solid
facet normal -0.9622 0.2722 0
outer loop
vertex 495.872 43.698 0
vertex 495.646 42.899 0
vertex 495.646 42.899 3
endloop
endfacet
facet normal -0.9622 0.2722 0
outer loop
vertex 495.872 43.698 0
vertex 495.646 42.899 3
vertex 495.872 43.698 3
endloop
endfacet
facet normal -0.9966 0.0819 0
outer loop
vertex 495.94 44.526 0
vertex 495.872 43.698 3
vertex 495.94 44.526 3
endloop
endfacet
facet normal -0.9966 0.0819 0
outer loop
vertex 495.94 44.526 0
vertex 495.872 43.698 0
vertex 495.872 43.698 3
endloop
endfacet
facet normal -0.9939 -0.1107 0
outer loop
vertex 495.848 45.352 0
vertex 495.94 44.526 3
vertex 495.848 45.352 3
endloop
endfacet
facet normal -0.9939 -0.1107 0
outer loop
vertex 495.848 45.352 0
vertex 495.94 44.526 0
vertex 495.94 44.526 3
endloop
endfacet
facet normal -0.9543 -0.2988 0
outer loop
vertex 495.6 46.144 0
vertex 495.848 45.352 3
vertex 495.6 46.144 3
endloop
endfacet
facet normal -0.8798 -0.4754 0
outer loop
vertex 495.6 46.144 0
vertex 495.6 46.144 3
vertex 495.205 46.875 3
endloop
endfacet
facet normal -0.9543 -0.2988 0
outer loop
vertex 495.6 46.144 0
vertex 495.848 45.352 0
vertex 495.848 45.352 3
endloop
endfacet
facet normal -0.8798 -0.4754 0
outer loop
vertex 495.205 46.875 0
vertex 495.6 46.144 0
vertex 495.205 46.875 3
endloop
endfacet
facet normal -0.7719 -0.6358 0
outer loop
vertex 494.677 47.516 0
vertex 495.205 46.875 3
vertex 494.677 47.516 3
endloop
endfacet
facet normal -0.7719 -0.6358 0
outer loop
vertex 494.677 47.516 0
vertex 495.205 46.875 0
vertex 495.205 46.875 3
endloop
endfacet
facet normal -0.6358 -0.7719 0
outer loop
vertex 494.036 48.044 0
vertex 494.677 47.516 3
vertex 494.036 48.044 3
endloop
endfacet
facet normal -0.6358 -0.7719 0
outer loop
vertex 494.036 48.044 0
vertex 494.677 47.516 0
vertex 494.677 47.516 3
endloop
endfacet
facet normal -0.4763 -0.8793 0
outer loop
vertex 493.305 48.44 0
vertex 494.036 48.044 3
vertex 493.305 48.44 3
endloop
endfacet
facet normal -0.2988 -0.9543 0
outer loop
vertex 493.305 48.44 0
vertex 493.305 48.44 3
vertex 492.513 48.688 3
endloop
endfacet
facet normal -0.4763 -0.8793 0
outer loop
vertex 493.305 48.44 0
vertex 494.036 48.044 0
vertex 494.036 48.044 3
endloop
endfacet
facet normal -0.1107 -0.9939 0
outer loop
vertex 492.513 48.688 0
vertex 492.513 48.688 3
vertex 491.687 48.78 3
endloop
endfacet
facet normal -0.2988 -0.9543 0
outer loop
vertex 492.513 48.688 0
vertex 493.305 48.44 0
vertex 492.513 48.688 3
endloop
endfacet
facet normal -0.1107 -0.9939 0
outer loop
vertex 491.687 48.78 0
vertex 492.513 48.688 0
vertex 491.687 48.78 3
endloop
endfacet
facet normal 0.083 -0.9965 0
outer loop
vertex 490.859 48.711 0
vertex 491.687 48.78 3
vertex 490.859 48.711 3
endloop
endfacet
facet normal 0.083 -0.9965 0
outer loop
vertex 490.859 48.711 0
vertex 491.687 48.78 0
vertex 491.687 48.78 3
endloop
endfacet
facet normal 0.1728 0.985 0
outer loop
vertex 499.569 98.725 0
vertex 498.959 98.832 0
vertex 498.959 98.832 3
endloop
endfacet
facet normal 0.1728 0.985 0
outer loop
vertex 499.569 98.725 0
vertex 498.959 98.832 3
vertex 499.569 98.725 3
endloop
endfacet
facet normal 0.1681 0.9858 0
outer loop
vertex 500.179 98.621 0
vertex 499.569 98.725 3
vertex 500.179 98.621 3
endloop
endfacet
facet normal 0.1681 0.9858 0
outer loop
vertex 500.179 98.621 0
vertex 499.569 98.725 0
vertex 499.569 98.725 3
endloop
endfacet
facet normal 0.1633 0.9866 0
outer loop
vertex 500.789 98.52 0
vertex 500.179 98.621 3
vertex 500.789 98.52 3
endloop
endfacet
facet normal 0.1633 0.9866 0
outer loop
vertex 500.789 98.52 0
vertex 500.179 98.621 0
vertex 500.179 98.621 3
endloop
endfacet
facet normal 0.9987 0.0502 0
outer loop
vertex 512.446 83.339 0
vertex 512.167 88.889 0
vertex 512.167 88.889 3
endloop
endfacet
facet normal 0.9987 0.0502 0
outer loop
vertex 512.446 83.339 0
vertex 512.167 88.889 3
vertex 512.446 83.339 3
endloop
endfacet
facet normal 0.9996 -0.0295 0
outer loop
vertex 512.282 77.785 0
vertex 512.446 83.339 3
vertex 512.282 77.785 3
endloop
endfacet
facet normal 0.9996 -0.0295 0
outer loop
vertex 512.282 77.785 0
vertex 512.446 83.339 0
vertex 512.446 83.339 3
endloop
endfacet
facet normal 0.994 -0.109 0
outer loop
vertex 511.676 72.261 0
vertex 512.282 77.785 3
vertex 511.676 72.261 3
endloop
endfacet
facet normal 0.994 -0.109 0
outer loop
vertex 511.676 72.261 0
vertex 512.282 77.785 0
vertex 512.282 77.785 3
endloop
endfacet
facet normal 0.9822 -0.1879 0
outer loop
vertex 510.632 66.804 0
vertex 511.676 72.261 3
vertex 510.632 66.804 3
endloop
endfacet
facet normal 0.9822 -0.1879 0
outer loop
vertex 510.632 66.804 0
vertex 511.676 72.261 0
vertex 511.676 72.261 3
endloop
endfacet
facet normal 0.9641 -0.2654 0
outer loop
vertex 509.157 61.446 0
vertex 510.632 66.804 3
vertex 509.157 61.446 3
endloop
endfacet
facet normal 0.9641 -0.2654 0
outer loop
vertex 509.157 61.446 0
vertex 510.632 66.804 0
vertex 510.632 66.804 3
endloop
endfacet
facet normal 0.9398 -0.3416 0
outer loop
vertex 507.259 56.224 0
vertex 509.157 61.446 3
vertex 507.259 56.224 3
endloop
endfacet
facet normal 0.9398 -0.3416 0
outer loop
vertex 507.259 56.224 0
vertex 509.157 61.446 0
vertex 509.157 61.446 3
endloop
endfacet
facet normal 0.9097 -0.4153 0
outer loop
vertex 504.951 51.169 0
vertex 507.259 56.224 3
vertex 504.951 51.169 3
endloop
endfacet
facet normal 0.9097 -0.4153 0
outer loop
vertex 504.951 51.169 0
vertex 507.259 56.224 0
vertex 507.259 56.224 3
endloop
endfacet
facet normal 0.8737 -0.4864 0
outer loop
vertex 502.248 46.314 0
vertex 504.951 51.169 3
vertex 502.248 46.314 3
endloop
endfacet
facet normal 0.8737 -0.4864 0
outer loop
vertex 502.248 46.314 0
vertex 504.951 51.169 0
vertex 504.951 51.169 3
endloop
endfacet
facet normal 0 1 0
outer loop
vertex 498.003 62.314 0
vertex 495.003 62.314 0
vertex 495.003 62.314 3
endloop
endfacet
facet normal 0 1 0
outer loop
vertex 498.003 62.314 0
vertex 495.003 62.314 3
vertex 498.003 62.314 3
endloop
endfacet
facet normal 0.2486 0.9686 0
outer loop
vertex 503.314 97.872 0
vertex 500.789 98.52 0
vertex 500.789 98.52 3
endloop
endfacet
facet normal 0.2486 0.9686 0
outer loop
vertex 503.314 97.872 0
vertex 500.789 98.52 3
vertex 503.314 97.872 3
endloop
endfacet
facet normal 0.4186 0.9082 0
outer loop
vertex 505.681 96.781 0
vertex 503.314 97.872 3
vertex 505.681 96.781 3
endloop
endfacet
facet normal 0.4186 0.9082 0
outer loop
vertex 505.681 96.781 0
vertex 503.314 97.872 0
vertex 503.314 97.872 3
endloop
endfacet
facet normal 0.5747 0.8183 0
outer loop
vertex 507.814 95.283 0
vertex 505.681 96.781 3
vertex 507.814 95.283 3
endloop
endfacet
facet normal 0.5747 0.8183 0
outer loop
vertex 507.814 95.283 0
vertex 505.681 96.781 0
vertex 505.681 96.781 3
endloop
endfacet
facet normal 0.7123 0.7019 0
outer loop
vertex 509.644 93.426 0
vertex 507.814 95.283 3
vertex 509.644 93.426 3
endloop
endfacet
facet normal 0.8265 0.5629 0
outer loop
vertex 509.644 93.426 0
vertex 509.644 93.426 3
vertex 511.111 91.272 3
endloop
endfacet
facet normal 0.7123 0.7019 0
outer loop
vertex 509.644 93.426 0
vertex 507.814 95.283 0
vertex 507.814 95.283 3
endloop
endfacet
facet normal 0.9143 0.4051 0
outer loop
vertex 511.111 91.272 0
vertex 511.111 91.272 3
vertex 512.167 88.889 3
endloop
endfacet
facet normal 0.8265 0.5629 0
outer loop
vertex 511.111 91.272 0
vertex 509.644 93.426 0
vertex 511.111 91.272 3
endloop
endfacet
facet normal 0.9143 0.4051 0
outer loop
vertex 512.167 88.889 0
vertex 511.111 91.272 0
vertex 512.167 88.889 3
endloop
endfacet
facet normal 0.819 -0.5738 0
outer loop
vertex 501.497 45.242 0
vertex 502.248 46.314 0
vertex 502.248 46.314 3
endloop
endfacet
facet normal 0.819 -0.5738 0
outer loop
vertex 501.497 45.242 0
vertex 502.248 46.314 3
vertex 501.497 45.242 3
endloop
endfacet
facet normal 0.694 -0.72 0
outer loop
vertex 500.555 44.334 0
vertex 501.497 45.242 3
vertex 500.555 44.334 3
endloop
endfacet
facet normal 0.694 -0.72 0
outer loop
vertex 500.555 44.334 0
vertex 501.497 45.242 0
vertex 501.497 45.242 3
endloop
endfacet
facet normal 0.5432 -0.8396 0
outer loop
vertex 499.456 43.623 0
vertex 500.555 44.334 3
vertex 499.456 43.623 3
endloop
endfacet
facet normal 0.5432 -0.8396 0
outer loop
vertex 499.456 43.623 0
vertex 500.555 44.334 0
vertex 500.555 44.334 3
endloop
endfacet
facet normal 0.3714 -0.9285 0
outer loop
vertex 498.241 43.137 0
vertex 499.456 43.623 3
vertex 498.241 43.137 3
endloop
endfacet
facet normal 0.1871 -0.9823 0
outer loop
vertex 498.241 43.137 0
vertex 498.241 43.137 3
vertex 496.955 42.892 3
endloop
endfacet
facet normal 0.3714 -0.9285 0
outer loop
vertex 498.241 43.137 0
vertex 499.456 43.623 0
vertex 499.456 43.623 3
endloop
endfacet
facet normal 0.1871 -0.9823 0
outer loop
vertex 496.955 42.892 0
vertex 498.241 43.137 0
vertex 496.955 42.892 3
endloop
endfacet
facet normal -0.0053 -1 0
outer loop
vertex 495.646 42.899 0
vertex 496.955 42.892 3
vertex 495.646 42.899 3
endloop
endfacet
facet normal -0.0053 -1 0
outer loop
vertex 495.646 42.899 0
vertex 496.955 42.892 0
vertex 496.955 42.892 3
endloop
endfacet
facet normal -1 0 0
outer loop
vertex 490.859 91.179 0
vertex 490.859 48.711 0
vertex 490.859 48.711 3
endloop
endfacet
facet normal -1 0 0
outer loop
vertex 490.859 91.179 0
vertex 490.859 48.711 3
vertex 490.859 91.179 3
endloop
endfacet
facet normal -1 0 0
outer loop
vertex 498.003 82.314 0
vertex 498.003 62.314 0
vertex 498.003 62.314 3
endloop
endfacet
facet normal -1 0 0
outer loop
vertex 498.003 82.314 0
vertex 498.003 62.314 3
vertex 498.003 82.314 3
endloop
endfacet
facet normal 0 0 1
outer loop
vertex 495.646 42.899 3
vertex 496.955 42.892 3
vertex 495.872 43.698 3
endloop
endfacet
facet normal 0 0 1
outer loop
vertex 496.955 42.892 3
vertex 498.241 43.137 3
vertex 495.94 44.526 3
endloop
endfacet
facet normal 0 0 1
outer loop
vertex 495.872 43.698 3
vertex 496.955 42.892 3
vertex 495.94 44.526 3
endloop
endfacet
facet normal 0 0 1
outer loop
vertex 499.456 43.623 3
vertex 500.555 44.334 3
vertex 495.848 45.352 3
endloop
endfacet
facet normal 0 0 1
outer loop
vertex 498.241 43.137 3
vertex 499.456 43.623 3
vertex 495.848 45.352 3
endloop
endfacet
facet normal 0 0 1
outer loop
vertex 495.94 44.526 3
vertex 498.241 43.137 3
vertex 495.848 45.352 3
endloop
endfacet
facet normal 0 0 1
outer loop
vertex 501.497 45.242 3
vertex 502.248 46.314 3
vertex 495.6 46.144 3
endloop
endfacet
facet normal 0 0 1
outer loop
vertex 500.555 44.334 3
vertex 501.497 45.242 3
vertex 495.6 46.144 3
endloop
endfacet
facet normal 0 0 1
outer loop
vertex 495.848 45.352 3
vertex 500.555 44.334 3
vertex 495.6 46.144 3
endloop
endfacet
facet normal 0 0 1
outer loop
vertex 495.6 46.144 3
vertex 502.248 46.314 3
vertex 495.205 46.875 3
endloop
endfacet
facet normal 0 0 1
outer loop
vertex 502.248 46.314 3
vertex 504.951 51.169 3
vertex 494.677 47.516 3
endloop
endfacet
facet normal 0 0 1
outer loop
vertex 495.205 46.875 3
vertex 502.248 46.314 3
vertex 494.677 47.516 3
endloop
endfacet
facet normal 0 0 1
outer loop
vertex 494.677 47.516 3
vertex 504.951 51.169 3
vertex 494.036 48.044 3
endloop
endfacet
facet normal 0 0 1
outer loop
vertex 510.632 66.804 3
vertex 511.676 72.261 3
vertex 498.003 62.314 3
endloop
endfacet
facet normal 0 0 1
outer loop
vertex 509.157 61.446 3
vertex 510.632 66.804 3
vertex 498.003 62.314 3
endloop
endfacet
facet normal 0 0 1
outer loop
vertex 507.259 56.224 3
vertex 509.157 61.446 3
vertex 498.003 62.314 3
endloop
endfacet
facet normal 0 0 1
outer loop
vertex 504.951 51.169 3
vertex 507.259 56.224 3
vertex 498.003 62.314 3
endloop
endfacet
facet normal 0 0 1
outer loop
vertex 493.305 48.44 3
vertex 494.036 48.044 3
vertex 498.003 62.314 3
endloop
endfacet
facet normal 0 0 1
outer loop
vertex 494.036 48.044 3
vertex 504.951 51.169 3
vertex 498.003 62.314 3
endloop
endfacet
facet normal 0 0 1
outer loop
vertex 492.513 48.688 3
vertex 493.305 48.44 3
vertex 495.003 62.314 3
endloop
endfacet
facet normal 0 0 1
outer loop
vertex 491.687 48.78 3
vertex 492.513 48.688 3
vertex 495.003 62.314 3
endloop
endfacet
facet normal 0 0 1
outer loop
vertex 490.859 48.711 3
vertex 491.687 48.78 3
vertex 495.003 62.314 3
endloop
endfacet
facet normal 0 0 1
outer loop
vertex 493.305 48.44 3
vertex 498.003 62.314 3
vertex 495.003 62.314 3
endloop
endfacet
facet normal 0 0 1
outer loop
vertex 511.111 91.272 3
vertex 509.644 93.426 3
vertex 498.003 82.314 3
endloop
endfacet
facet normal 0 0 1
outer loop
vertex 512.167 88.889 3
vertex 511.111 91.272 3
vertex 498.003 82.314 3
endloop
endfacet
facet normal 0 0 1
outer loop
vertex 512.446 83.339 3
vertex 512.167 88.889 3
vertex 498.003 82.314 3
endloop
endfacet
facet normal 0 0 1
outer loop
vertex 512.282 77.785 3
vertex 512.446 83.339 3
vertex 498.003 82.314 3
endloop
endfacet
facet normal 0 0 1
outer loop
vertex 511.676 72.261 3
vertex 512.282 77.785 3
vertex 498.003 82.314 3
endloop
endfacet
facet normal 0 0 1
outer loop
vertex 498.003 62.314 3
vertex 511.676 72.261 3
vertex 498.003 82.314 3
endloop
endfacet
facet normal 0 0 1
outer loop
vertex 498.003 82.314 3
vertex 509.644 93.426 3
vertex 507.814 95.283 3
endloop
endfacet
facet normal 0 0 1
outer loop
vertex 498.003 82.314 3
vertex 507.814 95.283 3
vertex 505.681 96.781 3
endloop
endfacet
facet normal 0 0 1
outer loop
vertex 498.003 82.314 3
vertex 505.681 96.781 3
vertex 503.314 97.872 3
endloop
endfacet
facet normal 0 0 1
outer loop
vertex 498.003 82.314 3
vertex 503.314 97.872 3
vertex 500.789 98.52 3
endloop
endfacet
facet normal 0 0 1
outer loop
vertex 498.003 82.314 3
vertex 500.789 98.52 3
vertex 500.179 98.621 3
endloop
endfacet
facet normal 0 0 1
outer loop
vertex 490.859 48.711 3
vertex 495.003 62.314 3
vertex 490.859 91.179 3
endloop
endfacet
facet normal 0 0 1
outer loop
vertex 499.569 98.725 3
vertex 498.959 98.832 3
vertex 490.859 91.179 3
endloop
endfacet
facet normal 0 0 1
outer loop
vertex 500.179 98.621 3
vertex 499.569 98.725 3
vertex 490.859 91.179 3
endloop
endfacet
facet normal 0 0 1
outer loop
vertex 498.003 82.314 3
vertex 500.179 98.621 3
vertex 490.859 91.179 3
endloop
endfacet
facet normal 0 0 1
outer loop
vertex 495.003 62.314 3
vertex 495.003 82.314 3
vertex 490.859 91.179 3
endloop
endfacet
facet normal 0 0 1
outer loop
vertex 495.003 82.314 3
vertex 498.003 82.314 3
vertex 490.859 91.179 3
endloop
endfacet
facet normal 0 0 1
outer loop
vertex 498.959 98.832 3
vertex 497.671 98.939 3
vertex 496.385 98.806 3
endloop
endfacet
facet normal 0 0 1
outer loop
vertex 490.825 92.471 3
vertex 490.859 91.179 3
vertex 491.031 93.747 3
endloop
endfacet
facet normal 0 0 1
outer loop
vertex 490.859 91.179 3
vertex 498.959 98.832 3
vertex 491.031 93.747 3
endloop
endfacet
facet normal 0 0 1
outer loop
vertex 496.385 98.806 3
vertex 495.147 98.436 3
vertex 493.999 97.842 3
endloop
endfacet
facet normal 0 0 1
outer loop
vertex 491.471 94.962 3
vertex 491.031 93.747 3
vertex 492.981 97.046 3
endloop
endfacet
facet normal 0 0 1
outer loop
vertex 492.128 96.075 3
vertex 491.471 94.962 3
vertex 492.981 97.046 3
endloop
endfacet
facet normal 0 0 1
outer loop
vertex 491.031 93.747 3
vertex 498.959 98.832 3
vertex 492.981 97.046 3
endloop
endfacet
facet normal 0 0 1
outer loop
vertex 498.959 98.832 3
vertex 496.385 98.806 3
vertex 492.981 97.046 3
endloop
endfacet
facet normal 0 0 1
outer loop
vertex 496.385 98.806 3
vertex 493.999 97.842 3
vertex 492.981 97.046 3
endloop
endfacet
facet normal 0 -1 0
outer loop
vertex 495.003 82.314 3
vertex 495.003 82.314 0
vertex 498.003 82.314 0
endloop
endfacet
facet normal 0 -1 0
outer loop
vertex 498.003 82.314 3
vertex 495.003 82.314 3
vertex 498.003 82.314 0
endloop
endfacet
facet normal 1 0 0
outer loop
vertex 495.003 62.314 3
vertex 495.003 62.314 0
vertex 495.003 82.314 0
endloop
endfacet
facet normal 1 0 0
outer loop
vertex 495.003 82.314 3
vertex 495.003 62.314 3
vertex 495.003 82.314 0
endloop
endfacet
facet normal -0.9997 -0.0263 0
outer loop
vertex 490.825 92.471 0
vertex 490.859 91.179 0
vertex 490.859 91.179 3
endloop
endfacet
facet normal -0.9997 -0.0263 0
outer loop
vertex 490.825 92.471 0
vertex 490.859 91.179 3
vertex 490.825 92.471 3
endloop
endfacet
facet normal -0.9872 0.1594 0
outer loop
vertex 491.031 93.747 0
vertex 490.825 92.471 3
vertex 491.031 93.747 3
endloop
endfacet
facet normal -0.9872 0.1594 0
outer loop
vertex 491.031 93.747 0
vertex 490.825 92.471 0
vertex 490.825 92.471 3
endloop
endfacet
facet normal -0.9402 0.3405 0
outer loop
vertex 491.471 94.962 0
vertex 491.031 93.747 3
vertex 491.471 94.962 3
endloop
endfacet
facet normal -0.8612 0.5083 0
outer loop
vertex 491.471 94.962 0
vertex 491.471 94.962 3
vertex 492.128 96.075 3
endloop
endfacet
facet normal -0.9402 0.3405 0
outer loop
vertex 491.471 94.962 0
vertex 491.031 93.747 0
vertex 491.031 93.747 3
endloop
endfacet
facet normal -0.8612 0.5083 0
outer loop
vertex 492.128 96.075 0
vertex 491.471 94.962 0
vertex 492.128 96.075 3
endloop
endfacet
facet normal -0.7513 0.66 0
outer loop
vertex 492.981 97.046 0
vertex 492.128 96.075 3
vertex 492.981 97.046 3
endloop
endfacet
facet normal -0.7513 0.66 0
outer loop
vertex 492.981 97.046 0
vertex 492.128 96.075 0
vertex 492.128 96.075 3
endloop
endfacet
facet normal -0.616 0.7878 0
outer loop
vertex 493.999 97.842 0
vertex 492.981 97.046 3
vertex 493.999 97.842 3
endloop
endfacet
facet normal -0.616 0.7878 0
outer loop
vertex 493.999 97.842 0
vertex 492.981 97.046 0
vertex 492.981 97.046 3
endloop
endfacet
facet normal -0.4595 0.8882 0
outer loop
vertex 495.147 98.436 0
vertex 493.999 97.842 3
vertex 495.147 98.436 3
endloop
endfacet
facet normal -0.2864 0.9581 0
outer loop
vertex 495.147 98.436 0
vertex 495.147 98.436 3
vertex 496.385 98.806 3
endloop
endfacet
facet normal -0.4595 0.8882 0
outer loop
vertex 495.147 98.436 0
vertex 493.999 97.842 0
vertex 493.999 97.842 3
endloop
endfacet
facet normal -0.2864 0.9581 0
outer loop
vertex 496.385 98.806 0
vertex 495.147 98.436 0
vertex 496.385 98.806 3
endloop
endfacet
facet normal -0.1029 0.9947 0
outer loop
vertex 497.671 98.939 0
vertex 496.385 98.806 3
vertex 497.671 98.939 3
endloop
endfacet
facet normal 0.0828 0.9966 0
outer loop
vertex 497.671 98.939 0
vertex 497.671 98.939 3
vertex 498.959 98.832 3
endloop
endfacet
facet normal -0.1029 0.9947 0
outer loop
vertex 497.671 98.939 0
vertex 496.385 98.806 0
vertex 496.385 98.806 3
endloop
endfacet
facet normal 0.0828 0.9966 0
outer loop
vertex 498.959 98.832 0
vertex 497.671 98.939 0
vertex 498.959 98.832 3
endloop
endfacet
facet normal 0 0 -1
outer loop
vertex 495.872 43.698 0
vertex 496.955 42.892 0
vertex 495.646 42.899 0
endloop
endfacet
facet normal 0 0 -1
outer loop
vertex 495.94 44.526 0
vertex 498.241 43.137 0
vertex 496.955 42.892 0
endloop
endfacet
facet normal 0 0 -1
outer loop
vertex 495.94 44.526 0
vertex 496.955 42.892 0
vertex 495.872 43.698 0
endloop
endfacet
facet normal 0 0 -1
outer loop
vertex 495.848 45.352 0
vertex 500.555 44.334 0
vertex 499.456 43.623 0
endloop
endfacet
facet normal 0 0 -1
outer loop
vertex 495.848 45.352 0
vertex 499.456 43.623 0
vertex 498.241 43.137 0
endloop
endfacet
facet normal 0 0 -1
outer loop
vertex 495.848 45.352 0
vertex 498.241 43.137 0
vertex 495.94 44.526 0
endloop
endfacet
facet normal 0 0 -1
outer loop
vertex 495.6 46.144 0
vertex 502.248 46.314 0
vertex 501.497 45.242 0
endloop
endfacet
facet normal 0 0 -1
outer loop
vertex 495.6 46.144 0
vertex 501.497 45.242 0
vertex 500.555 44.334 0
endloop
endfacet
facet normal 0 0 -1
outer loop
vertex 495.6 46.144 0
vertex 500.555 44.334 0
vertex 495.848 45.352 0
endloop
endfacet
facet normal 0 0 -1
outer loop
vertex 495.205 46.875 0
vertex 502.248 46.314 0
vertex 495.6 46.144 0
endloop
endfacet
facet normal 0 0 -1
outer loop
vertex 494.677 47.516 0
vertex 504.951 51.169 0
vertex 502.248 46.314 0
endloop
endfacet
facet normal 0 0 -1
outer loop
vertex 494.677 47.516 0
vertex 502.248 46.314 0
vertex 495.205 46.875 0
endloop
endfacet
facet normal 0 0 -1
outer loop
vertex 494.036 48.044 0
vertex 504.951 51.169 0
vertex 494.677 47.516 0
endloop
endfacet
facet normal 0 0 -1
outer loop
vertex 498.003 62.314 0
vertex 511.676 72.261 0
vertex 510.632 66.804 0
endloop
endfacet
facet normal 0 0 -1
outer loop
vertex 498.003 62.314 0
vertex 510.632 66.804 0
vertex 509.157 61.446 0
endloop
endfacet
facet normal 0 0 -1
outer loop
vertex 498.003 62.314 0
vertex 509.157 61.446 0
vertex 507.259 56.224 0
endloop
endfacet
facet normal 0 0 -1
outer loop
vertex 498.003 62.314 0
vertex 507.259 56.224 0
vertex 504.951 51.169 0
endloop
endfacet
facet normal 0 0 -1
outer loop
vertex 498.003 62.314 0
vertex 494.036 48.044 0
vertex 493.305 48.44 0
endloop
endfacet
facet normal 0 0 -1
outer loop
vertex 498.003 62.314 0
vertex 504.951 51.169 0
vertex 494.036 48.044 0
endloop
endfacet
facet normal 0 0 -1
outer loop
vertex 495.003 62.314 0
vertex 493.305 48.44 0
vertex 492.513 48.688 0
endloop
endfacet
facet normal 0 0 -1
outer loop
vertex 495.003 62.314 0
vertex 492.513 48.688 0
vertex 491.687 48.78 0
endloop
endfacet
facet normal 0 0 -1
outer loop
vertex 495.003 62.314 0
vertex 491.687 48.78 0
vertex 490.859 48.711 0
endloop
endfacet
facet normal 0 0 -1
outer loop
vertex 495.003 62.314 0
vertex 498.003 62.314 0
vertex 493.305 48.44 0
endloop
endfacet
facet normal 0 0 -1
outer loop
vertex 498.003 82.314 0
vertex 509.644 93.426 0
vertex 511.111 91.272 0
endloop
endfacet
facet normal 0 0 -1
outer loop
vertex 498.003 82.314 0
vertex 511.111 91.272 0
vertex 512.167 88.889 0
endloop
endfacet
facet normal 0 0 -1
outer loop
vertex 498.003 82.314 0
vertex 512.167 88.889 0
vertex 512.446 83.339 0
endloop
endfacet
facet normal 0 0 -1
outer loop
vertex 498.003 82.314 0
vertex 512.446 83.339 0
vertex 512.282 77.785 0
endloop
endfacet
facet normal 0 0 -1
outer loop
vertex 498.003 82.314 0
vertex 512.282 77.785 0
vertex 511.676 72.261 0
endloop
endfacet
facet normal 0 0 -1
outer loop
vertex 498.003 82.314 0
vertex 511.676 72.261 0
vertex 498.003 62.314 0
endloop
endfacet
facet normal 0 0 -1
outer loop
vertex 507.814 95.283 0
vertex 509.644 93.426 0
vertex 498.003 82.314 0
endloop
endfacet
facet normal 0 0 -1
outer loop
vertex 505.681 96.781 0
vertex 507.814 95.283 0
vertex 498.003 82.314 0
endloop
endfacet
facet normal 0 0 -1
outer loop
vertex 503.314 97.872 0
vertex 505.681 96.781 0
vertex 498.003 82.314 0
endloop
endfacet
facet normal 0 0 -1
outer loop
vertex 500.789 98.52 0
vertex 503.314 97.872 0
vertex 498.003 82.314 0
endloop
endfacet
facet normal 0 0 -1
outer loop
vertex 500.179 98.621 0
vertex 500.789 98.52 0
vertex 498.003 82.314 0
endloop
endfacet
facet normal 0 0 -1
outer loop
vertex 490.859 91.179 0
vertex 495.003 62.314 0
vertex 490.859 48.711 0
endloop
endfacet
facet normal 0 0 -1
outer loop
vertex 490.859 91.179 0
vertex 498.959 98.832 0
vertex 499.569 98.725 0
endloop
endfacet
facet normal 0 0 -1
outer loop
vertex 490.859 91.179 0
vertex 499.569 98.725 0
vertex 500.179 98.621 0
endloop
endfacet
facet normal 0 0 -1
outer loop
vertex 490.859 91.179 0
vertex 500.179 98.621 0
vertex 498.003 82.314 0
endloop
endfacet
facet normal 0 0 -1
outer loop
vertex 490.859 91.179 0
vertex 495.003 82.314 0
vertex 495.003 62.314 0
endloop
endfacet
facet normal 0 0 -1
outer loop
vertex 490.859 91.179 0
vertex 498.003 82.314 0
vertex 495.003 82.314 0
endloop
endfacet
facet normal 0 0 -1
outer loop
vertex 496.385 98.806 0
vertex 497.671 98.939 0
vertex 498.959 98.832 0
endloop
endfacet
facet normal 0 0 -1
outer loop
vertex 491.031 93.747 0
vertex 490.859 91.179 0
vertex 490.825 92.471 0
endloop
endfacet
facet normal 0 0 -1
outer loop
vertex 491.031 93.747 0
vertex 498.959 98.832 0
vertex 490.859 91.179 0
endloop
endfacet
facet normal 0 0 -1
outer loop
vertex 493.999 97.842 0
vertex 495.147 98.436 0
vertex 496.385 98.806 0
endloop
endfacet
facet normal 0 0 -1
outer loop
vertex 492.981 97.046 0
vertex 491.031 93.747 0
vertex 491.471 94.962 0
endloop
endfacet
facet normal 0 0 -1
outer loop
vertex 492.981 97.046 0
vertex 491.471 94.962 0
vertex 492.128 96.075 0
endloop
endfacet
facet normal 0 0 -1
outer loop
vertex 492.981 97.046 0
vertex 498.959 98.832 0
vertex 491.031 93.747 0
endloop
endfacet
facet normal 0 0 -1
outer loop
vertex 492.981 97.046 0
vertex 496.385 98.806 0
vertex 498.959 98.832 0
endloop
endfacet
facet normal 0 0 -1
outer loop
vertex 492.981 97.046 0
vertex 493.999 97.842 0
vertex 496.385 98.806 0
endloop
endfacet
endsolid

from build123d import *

# Parameters (mm, degrees)
SKETCH1_W          = 3
SKETCH1_H          = 20
BASE_EXTRUDE_DEPTH = 3


with BuildPart() as part:
    # Sketch1 → Base-Extrude (new body)
    with BuildSketch(Plane.XY):
        with BuildLine():
            Line((490.859334316, 48.711445231), (490.859334316, 91.178595635))
            ThreePointArc((490.859334316, 91.178595635), (492.980510735, 97.046258165), (498.958835763, 98.831890501))
            ThreePointArc((498.958835763, 98.831890501), (499.873560394, 98.672316261), (500.789492391, 98.519824725))
            ThreePointArc((500.789492391, 98.519824725), (507.814480551, 95.282897305), (512.167074898, 88.888909486))
            ThreePointArc((512.167074898, 88.888909486), (510.632309562, 66.803543283), (502.248398483, 46.313815613))
            ThreePointArc((502.248398483, 46.313815613), (499.455679175, 43.623308538), (495.646031752, 42.898949534))
            ThreePointArc((495.646031752, 42.898949534), (494.9563895, 47.208231088), (490.859334316, 48.711445231))
        make_face()
        with Locations((496.503228356, 72.313930056)):
            Rectangle(SKETCH1_W, SKETCH1_H, mode=Mode.SUBTRACT)
    extrude(amount=BASE_EXTRUDE_DEPTH)


solid = part.part
